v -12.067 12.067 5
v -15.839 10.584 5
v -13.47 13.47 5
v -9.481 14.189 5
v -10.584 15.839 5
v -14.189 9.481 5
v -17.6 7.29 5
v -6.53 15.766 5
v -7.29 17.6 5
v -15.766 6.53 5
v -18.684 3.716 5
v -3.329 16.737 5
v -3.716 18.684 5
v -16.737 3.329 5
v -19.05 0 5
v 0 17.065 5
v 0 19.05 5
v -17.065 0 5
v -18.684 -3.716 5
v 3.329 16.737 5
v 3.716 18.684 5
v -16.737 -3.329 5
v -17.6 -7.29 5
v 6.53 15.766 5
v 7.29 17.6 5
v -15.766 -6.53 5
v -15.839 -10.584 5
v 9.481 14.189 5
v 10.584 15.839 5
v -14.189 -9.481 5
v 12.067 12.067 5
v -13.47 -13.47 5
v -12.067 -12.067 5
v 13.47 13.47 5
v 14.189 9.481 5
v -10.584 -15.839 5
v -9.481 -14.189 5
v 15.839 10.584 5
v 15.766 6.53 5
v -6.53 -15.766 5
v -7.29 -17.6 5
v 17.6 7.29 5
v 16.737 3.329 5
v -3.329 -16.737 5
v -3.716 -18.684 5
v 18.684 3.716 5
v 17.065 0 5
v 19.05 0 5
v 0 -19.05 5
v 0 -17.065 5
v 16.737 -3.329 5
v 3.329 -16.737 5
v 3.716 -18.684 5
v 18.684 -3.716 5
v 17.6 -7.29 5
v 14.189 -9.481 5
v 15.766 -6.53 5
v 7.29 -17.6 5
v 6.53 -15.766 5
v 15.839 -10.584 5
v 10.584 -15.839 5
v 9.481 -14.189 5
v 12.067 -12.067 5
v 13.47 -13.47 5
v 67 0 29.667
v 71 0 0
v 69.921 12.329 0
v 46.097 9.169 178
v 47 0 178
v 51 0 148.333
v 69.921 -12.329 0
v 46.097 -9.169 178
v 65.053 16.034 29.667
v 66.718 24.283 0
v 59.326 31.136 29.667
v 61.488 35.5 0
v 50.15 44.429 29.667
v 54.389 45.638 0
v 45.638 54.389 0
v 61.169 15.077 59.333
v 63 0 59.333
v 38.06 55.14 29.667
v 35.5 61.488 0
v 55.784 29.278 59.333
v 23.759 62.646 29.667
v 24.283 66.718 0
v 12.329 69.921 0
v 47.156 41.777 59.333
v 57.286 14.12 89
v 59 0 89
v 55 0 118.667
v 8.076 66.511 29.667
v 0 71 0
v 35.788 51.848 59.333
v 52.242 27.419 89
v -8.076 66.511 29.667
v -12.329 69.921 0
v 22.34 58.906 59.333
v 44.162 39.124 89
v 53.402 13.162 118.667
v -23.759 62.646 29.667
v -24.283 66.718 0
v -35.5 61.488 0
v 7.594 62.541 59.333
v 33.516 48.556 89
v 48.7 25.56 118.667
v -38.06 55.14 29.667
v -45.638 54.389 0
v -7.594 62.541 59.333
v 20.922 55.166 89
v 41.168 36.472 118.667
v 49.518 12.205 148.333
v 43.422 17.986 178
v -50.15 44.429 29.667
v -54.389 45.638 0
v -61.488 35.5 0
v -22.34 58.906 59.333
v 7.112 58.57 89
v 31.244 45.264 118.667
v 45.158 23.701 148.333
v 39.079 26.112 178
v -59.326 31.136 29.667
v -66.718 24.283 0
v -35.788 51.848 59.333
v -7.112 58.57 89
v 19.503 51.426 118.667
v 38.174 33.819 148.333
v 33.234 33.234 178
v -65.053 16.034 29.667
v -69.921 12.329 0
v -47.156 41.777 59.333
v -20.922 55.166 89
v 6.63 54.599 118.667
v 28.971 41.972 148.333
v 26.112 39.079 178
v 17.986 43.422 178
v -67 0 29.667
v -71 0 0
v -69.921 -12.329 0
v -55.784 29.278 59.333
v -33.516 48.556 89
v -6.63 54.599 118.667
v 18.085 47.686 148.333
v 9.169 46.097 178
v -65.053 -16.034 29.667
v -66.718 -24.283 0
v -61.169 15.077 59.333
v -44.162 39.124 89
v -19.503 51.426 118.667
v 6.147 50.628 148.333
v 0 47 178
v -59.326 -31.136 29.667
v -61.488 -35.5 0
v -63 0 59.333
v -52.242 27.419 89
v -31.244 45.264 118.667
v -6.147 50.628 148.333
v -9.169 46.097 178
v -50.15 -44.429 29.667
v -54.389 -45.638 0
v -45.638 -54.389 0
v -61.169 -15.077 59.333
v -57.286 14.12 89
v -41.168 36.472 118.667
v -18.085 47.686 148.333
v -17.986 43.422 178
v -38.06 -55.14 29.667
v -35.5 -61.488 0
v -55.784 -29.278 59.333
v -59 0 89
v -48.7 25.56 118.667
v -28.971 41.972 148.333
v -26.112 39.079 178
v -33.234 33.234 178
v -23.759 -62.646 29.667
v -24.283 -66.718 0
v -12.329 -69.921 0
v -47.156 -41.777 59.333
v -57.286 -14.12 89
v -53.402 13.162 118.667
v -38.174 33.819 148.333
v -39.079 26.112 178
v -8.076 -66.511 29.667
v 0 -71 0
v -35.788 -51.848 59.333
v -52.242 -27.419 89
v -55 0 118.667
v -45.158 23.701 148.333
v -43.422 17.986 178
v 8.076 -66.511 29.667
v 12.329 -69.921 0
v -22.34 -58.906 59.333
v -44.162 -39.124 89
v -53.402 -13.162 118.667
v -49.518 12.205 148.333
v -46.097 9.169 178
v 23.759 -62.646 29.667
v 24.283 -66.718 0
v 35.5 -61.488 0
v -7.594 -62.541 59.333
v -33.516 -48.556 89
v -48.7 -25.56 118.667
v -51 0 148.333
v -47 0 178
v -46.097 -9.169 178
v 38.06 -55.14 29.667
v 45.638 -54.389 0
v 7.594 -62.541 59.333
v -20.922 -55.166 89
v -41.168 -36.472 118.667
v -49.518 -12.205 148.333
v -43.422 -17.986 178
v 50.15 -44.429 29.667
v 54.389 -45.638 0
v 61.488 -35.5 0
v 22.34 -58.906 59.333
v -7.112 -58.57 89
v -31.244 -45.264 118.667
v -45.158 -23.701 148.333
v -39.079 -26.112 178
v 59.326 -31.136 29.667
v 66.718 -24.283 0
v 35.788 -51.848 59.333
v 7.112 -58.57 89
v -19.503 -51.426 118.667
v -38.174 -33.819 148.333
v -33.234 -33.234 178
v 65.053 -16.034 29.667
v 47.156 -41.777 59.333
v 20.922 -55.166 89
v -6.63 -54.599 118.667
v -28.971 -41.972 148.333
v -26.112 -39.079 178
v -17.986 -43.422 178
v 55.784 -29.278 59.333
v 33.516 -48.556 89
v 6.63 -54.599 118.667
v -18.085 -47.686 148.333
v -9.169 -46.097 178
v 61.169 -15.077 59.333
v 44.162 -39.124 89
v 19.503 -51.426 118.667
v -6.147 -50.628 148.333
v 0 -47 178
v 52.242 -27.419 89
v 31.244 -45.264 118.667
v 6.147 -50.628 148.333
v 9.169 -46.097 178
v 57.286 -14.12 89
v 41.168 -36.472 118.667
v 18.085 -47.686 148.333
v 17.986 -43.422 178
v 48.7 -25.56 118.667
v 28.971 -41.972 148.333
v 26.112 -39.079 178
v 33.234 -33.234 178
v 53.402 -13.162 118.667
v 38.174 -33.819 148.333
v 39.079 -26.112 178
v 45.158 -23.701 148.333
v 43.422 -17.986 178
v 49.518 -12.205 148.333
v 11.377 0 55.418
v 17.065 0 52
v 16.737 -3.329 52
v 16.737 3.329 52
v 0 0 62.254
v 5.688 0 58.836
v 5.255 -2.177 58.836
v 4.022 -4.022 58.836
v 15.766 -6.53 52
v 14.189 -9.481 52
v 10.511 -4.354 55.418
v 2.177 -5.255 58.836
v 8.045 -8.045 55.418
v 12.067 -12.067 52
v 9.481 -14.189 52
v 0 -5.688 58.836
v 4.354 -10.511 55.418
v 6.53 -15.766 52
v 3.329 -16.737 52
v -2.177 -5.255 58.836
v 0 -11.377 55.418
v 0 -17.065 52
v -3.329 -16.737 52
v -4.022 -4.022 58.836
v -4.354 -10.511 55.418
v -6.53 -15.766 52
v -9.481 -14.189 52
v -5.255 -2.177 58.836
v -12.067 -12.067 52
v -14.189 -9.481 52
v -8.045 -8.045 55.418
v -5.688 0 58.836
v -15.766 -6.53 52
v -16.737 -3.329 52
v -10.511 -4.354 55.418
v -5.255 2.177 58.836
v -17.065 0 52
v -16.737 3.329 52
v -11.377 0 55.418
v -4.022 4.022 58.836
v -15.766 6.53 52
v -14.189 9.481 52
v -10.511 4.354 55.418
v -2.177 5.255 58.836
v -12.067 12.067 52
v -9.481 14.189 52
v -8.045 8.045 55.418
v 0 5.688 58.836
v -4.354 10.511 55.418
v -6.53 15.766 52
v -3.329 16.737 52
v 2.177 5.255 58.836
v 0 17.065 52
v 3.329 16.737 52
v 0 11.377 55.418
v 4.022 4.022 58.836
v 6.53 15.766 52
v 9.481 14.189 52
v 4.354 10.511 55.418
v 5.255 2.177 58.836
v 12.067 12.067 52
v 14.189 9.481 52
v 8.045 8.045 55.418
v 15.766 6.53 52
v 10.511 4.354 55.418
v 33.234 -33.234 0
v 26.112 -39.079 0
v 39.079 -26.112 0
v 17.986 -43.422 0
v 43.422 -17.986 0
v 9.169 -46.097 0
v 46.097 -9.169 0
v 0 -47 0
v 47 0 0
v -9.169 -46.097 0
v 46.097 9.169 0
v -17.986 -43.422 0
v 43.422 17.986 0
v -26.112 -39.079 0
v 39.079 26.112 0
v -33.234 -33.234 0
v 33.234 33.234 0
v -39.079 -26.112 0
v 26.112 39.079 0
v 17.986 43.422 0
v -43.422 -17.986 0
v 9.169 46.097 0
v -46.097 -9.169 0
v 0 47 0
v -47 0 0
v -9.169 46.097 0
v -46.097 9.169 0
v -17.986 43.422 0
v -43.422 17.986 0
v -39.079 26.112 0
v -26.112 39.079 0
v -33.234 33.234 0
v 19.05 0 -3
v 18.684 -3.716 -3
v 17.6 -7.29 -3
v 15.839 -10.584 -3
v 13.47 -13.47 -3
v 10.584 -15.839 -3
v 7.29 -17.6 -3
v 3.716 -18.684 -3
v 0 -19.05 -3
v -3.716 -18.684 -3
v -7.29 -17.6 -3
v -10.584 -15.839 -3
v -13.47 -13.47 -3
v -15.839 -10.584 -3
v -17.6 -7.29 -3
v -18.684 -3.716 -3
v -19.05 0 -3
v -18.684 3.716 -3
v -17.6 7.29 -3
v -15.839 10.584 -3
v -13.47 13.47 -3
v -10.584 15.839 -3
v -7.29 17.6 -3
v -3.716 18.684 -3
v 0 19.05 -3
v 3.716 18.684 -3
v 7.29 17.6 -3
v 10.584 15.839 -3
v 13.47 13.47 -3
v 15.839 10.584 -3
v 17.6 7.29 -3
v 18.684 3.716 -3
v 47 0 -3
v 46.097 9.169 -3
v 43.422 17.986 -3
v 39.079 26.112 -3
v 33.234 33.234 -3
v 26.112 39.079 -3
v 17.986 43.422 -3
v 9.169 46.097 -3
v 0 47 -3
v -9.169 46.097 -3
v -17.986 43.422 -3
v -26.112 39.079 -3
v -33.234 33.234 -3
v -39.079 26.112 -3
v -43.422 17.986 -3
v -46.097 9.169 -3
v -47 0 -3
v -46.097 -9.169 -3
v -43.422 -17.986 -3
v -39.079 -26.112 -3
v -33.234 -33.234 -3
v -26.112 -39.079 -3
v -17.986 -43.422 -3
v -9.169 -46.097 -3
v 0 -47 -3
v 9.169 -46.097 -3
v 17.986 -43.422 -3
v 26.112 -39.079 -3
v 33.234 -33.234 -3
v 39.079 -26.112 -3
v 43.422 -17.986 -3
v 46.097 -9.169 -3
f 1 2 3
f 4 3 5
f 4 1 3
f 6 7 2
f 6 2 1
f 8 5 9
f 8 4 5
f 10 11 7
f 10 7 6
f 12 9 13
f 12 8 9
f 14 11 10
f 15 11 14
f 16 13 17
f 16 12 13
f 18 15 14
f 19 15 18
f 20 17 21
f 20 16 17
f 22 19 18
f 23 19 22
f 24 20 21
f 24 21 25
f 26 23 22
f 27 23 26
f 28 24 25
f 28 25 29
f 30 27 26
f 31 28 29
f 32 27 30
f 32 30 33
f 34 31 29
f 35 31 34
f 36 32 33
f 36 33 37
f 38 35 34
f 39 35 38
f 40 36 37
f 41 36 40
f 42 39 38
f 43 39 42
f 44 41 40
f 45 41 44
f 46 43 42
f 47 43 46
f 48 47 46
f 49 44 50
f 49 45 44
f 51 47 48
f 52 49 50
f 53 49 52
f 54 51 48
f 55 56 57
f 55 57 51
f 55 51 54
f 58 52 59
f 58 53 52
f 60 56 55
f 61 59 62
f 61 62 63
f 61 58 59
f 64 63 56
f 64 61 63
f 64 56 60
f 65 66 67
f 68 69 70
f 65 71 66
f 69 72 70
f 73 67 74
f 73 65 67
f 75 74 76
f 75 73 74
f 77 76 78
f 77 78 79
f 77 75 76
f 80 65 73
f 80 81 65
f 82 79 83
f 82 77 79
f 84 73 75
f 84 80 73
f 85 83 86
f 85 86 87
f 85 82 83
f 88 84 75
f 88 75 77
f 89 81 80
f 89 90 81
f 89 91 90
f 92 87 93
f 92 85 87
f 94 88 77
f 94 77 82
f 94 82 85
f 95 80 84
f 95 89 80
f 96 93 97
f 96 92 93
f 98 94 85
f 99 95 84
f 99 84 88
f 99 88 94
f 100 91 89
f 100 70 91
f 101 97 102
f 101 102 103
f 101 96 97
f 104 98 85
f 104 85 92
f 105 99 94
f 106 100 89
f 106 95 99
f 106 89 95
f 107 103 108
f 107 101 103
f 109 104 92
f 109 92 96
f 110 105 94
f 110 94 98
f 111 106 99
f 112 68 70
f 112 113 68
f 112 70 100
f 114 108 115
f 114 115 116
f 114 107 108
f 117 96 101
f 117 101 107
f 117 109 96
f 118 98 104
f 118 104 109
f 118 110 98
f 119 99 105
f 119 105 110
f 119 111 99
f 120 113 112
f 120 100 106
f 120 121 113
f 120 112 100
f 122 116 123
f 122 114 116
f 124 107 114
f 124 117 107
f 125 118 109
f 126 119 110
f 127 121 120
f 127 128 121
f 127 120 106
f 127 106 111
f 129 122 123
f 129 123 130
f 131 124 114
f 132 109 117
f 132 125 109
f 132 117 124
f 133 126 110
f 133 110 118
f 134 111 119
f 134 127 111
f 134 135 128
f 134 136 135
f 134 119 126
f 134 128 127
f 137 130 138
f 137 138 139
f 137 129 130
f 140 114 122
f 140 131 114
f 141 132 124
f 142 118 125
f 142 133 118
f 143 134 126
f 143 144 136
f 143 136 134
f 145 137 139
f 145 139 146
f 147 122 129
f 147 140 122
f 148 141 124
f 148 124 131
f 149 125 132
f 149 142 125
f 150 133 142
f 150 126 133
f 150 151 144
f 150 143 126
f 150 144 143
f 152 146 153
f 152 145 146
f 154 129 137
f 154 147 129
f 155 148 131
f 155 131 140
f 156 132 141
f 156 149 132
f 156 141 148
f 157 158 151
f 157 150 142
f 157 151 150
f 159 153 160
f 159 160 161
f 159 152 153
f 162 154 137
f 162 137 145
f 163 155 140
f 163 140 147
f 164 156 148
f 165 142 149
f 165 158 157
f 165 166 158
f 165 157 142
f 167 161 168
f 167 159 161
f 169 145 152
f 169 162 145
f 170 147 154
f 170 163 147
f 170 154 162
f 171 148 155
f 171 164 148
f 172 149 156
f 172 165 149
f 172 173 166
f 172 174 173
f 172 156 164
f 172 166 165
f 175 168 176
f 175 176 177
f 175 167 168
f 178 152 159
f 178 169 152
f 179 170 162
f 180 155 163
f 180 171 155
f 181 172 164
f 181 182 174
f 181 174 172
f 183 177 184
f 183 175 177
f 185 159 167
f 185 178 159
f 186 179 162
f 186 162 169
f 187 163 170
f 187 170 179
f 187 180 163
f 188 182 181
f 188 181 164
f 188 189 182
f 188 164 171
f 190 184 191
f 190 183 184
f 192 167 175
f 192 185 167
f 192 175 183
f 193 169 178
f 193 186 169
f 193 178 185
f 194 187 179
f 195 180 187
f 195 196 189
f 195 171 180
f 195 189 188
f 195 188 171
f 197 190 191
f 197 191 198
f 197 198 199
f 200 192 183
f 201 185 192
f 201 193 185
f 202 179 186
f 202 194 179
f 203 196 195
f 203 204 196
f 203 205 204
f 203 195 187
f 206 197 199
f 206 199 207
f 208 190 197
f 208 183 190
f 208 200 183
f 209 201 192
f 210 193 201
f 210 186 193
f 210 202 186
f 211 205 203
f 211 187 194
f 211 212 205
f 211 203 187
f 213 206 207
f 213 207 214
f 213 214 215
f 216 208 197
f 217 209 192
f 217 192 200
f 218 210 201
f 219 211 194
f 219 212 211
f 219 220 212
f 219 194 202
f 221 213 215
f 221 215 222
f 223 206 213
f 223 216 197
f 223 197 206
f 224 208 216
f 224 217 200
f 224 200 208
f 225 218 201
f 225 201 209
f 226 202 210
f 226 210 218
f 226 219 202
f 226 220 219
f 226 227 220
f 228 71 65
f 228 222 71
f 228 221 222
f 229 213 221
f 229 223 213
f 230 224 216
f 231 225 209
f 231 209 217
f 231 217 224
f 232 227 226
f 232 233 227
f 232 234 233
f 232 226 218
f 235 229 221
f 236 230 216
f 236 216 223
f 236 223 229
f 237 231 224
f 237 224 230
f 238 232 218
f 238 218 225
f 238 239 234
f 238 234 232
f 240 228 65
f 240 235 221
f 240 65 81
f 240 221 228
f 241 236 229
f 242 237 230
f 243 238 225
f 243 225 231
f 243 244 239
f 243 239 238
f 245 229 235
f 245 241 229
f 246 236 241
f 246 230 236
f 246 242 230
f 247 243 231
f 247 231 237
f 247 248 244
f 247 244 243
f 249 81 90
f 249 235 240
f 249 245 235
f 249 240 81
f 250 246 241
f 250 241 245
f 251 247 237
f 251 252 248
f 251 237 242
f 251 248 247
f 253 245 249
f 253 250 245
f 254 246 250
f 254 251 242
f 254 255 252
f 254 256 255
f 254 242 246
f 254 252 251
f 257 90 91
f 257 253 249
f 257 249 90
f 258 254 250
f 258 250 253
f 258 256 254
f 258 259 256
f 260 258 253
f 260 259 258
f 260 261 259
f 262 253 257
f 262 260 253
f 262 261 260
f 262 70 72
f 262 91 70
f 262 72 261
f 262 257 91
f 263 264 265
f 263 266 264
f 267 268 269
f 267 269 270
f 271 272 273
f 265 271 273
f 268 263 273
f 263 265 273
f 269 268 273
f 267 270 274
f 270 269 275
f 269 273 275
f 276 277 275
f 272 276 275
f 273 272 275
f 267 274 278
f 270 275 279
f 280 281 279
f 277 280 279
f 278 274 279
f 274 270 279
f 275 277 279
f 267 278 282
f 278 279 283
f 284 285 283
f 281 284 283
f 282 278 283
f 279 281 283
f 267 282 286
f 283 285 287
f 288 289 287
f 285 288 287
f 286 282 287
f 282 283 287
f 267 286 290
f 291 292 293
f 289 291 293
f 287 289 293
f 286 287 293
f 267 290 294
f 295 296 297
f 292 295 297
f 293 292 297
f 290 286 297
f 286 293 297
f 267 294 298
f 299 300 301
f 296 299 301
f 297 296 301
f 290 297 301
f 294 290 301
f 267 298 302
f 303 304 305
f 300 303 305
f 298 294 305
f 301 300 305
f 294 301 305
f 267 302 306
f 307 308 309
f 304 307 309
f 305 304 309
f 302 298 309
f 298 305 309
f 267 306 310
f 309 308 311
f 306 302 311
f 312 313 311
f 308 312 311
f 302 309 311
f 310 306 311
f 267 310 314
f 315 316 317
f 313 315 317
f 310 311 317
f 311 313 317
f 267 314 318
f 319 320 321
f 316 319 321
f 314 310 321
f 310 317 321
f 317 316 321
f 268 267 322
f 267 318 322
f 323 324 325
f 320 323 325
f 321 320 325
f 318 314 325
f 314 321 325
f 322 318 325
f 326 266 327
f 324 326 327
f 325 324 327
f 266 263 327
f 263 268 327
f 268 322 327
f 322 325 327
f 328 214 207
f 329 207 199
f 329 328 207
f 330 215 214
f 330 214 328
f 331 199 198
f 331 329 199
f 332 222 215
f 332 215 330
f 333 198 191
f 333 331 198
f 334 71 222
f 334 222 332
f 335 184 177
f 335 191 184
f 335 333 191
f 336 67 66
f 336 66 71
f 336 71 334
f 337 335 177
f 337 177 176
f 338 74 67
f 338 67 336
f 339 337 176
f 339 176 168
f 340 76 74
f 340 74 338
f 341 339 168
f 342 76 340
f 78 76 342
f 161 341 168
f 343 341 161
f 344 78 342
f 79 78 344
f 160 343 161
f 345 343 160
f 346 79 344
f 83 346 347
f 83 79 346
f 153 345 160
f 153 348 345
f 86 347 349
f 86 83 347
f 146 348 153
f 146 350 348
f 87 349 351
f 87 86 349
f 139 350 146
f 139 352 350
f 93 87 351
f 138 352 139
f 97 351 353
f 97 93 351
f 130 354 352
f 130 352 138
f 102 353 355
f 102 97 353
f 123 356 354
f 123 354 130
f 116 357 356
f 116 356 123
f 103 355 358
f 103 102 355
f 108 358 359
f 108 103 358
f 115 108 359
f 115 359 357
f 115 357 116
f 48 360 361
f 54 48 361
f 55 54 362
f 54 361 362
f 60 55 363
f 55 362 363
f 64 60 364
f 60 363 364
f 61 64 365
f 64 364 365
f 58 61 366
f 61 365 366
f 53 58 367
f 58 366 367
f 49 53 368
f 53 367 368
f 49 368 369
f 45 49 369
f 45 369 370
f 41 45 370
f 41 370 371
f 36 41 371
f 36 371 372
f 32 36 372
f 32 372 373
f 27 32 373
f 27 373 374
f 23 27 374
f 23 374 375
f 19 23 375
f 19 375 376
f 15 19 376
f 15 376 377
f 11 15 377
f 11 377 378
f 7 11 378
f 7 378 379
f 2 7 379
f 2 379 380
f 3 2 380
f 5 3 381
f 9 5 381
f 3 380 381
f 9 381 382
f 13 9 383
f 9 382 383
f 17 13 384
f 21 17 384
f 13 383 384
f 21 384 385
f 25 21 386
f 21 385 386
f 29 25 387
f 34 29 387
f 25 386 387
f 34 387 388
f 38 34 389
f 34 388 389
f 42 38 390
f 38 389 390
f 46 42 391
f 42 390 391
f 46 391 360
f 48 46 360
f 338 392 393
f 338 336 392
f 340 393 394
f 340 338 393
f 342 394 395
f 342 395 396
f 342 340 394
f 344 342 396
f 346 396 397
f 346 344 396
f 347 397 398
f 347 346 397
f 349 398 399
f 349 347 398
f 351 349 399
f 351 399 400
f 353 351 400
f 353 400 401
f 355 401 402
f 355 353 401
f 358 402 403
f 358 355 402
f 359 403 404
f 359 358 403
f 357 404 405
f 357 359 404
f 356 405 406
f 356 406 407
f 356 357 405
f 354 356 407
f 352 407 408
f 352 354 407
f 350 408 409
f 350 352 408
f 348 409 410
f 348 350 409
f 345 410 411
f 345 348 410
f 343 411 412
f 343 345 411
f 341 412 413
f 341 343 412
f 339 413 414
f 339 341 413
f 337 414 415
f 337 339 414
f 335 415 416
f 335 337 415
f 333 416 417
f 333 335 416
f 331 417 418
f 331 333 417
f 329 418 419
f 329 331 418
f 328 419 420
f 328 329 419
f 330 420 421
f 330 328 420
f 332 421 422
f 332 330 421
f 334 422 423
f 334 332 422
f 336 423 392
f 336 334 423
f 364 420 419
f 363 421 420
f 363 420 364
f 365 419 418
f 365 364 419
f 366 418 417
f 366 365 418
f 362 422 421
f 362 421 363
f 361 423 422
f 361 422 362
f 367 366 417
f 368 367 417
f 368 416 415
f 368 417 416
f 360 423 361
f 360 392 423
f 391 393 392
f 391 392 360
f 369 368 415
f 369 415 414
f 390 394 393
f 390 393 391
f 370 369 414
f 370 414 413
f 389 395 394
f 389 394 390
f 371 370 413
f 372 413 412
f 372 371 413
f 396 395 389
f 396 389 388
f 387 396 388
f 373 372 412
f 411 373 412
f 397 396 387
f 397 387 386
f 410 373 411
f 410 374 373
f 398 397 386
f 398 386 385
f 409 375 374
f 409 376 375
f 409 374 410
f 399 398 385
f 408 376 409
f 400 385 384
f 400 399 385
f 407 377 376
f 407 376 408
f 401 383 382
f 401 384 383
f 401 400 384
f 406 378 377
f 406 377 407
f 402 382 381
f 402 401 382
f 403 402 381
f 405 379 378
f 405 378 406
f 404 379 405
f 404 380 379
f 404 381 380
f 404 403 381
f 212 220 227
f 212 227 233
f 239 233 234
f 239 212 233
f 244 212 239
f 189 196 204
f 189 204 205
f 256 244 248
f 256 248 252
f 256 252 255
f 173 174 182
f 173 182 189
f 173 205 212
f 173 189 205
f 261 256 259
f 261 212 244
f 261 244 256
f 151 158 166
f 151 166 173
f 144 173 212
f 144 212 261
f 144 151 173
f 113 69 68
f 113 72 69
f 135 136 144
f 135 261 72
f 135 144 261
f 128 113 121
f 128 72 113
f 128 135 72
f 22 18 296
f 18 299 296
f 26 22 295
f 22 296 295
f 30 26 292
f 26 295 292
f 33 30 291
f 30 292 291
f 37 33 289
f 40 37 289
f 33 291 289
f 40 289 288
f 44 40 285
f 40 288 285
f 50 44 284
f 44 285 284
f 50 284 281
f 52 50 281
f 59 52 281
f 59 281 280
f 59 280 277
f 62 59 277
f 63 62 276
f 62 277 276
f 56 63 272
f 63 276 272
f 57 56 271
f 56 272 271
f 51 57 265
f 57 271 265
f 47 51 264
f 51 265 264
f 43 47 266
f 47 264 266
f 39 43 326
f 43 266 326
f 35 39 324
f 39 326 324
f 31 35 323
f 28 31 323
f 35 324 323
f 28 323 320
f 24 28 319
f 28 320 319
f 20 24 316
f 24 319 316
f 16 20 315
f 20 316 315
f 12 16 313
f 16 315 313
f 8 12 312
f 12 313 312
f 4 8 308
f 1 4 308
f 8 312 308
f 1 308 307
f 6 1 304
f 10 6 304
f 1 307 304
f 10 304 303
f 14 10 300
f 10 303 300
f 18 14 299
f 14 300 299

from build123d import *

# Parameters (mm, degrees)
F3_D           = 34.12998
F3_DEPTH       = 55
F3_CBORE_D     = 38.1
F3_CBORE_DEPTH = 8
F3_TIP         = 10.2536804551


with BuildPart() as f1:
    # F0 (on Front) → F1 (revolve)
    with BuildSketch(Plane.XZ):
        Polygon((47, -3), (47, 0), (71, 0), (47, 178), (0, 178), (0, 0), (0, -3), align=None)
    revolve(axis=Axis((0, 0, 89), (0, 0, 1)))

    # F3
    with Locations(Plane(origin=(0, 0, -3), x_dir=(1, 0, 0), z_dir=(0, 0, -1))):
        with Locations((0, 0)):
            CounterBoreHole(F3_D / 2, F3_CBORE_D / 2, F3_CBORE_DEPTH, depth=F3_DEPTH)
            with Locations((0, 0, -(F3_DEPTH + F3_TIP / 2))):  # 118° drill point
                Cone(0, F3_D / 2, F3_TIP, mode=Mode.SUBTRACT)


solid = f1.part
